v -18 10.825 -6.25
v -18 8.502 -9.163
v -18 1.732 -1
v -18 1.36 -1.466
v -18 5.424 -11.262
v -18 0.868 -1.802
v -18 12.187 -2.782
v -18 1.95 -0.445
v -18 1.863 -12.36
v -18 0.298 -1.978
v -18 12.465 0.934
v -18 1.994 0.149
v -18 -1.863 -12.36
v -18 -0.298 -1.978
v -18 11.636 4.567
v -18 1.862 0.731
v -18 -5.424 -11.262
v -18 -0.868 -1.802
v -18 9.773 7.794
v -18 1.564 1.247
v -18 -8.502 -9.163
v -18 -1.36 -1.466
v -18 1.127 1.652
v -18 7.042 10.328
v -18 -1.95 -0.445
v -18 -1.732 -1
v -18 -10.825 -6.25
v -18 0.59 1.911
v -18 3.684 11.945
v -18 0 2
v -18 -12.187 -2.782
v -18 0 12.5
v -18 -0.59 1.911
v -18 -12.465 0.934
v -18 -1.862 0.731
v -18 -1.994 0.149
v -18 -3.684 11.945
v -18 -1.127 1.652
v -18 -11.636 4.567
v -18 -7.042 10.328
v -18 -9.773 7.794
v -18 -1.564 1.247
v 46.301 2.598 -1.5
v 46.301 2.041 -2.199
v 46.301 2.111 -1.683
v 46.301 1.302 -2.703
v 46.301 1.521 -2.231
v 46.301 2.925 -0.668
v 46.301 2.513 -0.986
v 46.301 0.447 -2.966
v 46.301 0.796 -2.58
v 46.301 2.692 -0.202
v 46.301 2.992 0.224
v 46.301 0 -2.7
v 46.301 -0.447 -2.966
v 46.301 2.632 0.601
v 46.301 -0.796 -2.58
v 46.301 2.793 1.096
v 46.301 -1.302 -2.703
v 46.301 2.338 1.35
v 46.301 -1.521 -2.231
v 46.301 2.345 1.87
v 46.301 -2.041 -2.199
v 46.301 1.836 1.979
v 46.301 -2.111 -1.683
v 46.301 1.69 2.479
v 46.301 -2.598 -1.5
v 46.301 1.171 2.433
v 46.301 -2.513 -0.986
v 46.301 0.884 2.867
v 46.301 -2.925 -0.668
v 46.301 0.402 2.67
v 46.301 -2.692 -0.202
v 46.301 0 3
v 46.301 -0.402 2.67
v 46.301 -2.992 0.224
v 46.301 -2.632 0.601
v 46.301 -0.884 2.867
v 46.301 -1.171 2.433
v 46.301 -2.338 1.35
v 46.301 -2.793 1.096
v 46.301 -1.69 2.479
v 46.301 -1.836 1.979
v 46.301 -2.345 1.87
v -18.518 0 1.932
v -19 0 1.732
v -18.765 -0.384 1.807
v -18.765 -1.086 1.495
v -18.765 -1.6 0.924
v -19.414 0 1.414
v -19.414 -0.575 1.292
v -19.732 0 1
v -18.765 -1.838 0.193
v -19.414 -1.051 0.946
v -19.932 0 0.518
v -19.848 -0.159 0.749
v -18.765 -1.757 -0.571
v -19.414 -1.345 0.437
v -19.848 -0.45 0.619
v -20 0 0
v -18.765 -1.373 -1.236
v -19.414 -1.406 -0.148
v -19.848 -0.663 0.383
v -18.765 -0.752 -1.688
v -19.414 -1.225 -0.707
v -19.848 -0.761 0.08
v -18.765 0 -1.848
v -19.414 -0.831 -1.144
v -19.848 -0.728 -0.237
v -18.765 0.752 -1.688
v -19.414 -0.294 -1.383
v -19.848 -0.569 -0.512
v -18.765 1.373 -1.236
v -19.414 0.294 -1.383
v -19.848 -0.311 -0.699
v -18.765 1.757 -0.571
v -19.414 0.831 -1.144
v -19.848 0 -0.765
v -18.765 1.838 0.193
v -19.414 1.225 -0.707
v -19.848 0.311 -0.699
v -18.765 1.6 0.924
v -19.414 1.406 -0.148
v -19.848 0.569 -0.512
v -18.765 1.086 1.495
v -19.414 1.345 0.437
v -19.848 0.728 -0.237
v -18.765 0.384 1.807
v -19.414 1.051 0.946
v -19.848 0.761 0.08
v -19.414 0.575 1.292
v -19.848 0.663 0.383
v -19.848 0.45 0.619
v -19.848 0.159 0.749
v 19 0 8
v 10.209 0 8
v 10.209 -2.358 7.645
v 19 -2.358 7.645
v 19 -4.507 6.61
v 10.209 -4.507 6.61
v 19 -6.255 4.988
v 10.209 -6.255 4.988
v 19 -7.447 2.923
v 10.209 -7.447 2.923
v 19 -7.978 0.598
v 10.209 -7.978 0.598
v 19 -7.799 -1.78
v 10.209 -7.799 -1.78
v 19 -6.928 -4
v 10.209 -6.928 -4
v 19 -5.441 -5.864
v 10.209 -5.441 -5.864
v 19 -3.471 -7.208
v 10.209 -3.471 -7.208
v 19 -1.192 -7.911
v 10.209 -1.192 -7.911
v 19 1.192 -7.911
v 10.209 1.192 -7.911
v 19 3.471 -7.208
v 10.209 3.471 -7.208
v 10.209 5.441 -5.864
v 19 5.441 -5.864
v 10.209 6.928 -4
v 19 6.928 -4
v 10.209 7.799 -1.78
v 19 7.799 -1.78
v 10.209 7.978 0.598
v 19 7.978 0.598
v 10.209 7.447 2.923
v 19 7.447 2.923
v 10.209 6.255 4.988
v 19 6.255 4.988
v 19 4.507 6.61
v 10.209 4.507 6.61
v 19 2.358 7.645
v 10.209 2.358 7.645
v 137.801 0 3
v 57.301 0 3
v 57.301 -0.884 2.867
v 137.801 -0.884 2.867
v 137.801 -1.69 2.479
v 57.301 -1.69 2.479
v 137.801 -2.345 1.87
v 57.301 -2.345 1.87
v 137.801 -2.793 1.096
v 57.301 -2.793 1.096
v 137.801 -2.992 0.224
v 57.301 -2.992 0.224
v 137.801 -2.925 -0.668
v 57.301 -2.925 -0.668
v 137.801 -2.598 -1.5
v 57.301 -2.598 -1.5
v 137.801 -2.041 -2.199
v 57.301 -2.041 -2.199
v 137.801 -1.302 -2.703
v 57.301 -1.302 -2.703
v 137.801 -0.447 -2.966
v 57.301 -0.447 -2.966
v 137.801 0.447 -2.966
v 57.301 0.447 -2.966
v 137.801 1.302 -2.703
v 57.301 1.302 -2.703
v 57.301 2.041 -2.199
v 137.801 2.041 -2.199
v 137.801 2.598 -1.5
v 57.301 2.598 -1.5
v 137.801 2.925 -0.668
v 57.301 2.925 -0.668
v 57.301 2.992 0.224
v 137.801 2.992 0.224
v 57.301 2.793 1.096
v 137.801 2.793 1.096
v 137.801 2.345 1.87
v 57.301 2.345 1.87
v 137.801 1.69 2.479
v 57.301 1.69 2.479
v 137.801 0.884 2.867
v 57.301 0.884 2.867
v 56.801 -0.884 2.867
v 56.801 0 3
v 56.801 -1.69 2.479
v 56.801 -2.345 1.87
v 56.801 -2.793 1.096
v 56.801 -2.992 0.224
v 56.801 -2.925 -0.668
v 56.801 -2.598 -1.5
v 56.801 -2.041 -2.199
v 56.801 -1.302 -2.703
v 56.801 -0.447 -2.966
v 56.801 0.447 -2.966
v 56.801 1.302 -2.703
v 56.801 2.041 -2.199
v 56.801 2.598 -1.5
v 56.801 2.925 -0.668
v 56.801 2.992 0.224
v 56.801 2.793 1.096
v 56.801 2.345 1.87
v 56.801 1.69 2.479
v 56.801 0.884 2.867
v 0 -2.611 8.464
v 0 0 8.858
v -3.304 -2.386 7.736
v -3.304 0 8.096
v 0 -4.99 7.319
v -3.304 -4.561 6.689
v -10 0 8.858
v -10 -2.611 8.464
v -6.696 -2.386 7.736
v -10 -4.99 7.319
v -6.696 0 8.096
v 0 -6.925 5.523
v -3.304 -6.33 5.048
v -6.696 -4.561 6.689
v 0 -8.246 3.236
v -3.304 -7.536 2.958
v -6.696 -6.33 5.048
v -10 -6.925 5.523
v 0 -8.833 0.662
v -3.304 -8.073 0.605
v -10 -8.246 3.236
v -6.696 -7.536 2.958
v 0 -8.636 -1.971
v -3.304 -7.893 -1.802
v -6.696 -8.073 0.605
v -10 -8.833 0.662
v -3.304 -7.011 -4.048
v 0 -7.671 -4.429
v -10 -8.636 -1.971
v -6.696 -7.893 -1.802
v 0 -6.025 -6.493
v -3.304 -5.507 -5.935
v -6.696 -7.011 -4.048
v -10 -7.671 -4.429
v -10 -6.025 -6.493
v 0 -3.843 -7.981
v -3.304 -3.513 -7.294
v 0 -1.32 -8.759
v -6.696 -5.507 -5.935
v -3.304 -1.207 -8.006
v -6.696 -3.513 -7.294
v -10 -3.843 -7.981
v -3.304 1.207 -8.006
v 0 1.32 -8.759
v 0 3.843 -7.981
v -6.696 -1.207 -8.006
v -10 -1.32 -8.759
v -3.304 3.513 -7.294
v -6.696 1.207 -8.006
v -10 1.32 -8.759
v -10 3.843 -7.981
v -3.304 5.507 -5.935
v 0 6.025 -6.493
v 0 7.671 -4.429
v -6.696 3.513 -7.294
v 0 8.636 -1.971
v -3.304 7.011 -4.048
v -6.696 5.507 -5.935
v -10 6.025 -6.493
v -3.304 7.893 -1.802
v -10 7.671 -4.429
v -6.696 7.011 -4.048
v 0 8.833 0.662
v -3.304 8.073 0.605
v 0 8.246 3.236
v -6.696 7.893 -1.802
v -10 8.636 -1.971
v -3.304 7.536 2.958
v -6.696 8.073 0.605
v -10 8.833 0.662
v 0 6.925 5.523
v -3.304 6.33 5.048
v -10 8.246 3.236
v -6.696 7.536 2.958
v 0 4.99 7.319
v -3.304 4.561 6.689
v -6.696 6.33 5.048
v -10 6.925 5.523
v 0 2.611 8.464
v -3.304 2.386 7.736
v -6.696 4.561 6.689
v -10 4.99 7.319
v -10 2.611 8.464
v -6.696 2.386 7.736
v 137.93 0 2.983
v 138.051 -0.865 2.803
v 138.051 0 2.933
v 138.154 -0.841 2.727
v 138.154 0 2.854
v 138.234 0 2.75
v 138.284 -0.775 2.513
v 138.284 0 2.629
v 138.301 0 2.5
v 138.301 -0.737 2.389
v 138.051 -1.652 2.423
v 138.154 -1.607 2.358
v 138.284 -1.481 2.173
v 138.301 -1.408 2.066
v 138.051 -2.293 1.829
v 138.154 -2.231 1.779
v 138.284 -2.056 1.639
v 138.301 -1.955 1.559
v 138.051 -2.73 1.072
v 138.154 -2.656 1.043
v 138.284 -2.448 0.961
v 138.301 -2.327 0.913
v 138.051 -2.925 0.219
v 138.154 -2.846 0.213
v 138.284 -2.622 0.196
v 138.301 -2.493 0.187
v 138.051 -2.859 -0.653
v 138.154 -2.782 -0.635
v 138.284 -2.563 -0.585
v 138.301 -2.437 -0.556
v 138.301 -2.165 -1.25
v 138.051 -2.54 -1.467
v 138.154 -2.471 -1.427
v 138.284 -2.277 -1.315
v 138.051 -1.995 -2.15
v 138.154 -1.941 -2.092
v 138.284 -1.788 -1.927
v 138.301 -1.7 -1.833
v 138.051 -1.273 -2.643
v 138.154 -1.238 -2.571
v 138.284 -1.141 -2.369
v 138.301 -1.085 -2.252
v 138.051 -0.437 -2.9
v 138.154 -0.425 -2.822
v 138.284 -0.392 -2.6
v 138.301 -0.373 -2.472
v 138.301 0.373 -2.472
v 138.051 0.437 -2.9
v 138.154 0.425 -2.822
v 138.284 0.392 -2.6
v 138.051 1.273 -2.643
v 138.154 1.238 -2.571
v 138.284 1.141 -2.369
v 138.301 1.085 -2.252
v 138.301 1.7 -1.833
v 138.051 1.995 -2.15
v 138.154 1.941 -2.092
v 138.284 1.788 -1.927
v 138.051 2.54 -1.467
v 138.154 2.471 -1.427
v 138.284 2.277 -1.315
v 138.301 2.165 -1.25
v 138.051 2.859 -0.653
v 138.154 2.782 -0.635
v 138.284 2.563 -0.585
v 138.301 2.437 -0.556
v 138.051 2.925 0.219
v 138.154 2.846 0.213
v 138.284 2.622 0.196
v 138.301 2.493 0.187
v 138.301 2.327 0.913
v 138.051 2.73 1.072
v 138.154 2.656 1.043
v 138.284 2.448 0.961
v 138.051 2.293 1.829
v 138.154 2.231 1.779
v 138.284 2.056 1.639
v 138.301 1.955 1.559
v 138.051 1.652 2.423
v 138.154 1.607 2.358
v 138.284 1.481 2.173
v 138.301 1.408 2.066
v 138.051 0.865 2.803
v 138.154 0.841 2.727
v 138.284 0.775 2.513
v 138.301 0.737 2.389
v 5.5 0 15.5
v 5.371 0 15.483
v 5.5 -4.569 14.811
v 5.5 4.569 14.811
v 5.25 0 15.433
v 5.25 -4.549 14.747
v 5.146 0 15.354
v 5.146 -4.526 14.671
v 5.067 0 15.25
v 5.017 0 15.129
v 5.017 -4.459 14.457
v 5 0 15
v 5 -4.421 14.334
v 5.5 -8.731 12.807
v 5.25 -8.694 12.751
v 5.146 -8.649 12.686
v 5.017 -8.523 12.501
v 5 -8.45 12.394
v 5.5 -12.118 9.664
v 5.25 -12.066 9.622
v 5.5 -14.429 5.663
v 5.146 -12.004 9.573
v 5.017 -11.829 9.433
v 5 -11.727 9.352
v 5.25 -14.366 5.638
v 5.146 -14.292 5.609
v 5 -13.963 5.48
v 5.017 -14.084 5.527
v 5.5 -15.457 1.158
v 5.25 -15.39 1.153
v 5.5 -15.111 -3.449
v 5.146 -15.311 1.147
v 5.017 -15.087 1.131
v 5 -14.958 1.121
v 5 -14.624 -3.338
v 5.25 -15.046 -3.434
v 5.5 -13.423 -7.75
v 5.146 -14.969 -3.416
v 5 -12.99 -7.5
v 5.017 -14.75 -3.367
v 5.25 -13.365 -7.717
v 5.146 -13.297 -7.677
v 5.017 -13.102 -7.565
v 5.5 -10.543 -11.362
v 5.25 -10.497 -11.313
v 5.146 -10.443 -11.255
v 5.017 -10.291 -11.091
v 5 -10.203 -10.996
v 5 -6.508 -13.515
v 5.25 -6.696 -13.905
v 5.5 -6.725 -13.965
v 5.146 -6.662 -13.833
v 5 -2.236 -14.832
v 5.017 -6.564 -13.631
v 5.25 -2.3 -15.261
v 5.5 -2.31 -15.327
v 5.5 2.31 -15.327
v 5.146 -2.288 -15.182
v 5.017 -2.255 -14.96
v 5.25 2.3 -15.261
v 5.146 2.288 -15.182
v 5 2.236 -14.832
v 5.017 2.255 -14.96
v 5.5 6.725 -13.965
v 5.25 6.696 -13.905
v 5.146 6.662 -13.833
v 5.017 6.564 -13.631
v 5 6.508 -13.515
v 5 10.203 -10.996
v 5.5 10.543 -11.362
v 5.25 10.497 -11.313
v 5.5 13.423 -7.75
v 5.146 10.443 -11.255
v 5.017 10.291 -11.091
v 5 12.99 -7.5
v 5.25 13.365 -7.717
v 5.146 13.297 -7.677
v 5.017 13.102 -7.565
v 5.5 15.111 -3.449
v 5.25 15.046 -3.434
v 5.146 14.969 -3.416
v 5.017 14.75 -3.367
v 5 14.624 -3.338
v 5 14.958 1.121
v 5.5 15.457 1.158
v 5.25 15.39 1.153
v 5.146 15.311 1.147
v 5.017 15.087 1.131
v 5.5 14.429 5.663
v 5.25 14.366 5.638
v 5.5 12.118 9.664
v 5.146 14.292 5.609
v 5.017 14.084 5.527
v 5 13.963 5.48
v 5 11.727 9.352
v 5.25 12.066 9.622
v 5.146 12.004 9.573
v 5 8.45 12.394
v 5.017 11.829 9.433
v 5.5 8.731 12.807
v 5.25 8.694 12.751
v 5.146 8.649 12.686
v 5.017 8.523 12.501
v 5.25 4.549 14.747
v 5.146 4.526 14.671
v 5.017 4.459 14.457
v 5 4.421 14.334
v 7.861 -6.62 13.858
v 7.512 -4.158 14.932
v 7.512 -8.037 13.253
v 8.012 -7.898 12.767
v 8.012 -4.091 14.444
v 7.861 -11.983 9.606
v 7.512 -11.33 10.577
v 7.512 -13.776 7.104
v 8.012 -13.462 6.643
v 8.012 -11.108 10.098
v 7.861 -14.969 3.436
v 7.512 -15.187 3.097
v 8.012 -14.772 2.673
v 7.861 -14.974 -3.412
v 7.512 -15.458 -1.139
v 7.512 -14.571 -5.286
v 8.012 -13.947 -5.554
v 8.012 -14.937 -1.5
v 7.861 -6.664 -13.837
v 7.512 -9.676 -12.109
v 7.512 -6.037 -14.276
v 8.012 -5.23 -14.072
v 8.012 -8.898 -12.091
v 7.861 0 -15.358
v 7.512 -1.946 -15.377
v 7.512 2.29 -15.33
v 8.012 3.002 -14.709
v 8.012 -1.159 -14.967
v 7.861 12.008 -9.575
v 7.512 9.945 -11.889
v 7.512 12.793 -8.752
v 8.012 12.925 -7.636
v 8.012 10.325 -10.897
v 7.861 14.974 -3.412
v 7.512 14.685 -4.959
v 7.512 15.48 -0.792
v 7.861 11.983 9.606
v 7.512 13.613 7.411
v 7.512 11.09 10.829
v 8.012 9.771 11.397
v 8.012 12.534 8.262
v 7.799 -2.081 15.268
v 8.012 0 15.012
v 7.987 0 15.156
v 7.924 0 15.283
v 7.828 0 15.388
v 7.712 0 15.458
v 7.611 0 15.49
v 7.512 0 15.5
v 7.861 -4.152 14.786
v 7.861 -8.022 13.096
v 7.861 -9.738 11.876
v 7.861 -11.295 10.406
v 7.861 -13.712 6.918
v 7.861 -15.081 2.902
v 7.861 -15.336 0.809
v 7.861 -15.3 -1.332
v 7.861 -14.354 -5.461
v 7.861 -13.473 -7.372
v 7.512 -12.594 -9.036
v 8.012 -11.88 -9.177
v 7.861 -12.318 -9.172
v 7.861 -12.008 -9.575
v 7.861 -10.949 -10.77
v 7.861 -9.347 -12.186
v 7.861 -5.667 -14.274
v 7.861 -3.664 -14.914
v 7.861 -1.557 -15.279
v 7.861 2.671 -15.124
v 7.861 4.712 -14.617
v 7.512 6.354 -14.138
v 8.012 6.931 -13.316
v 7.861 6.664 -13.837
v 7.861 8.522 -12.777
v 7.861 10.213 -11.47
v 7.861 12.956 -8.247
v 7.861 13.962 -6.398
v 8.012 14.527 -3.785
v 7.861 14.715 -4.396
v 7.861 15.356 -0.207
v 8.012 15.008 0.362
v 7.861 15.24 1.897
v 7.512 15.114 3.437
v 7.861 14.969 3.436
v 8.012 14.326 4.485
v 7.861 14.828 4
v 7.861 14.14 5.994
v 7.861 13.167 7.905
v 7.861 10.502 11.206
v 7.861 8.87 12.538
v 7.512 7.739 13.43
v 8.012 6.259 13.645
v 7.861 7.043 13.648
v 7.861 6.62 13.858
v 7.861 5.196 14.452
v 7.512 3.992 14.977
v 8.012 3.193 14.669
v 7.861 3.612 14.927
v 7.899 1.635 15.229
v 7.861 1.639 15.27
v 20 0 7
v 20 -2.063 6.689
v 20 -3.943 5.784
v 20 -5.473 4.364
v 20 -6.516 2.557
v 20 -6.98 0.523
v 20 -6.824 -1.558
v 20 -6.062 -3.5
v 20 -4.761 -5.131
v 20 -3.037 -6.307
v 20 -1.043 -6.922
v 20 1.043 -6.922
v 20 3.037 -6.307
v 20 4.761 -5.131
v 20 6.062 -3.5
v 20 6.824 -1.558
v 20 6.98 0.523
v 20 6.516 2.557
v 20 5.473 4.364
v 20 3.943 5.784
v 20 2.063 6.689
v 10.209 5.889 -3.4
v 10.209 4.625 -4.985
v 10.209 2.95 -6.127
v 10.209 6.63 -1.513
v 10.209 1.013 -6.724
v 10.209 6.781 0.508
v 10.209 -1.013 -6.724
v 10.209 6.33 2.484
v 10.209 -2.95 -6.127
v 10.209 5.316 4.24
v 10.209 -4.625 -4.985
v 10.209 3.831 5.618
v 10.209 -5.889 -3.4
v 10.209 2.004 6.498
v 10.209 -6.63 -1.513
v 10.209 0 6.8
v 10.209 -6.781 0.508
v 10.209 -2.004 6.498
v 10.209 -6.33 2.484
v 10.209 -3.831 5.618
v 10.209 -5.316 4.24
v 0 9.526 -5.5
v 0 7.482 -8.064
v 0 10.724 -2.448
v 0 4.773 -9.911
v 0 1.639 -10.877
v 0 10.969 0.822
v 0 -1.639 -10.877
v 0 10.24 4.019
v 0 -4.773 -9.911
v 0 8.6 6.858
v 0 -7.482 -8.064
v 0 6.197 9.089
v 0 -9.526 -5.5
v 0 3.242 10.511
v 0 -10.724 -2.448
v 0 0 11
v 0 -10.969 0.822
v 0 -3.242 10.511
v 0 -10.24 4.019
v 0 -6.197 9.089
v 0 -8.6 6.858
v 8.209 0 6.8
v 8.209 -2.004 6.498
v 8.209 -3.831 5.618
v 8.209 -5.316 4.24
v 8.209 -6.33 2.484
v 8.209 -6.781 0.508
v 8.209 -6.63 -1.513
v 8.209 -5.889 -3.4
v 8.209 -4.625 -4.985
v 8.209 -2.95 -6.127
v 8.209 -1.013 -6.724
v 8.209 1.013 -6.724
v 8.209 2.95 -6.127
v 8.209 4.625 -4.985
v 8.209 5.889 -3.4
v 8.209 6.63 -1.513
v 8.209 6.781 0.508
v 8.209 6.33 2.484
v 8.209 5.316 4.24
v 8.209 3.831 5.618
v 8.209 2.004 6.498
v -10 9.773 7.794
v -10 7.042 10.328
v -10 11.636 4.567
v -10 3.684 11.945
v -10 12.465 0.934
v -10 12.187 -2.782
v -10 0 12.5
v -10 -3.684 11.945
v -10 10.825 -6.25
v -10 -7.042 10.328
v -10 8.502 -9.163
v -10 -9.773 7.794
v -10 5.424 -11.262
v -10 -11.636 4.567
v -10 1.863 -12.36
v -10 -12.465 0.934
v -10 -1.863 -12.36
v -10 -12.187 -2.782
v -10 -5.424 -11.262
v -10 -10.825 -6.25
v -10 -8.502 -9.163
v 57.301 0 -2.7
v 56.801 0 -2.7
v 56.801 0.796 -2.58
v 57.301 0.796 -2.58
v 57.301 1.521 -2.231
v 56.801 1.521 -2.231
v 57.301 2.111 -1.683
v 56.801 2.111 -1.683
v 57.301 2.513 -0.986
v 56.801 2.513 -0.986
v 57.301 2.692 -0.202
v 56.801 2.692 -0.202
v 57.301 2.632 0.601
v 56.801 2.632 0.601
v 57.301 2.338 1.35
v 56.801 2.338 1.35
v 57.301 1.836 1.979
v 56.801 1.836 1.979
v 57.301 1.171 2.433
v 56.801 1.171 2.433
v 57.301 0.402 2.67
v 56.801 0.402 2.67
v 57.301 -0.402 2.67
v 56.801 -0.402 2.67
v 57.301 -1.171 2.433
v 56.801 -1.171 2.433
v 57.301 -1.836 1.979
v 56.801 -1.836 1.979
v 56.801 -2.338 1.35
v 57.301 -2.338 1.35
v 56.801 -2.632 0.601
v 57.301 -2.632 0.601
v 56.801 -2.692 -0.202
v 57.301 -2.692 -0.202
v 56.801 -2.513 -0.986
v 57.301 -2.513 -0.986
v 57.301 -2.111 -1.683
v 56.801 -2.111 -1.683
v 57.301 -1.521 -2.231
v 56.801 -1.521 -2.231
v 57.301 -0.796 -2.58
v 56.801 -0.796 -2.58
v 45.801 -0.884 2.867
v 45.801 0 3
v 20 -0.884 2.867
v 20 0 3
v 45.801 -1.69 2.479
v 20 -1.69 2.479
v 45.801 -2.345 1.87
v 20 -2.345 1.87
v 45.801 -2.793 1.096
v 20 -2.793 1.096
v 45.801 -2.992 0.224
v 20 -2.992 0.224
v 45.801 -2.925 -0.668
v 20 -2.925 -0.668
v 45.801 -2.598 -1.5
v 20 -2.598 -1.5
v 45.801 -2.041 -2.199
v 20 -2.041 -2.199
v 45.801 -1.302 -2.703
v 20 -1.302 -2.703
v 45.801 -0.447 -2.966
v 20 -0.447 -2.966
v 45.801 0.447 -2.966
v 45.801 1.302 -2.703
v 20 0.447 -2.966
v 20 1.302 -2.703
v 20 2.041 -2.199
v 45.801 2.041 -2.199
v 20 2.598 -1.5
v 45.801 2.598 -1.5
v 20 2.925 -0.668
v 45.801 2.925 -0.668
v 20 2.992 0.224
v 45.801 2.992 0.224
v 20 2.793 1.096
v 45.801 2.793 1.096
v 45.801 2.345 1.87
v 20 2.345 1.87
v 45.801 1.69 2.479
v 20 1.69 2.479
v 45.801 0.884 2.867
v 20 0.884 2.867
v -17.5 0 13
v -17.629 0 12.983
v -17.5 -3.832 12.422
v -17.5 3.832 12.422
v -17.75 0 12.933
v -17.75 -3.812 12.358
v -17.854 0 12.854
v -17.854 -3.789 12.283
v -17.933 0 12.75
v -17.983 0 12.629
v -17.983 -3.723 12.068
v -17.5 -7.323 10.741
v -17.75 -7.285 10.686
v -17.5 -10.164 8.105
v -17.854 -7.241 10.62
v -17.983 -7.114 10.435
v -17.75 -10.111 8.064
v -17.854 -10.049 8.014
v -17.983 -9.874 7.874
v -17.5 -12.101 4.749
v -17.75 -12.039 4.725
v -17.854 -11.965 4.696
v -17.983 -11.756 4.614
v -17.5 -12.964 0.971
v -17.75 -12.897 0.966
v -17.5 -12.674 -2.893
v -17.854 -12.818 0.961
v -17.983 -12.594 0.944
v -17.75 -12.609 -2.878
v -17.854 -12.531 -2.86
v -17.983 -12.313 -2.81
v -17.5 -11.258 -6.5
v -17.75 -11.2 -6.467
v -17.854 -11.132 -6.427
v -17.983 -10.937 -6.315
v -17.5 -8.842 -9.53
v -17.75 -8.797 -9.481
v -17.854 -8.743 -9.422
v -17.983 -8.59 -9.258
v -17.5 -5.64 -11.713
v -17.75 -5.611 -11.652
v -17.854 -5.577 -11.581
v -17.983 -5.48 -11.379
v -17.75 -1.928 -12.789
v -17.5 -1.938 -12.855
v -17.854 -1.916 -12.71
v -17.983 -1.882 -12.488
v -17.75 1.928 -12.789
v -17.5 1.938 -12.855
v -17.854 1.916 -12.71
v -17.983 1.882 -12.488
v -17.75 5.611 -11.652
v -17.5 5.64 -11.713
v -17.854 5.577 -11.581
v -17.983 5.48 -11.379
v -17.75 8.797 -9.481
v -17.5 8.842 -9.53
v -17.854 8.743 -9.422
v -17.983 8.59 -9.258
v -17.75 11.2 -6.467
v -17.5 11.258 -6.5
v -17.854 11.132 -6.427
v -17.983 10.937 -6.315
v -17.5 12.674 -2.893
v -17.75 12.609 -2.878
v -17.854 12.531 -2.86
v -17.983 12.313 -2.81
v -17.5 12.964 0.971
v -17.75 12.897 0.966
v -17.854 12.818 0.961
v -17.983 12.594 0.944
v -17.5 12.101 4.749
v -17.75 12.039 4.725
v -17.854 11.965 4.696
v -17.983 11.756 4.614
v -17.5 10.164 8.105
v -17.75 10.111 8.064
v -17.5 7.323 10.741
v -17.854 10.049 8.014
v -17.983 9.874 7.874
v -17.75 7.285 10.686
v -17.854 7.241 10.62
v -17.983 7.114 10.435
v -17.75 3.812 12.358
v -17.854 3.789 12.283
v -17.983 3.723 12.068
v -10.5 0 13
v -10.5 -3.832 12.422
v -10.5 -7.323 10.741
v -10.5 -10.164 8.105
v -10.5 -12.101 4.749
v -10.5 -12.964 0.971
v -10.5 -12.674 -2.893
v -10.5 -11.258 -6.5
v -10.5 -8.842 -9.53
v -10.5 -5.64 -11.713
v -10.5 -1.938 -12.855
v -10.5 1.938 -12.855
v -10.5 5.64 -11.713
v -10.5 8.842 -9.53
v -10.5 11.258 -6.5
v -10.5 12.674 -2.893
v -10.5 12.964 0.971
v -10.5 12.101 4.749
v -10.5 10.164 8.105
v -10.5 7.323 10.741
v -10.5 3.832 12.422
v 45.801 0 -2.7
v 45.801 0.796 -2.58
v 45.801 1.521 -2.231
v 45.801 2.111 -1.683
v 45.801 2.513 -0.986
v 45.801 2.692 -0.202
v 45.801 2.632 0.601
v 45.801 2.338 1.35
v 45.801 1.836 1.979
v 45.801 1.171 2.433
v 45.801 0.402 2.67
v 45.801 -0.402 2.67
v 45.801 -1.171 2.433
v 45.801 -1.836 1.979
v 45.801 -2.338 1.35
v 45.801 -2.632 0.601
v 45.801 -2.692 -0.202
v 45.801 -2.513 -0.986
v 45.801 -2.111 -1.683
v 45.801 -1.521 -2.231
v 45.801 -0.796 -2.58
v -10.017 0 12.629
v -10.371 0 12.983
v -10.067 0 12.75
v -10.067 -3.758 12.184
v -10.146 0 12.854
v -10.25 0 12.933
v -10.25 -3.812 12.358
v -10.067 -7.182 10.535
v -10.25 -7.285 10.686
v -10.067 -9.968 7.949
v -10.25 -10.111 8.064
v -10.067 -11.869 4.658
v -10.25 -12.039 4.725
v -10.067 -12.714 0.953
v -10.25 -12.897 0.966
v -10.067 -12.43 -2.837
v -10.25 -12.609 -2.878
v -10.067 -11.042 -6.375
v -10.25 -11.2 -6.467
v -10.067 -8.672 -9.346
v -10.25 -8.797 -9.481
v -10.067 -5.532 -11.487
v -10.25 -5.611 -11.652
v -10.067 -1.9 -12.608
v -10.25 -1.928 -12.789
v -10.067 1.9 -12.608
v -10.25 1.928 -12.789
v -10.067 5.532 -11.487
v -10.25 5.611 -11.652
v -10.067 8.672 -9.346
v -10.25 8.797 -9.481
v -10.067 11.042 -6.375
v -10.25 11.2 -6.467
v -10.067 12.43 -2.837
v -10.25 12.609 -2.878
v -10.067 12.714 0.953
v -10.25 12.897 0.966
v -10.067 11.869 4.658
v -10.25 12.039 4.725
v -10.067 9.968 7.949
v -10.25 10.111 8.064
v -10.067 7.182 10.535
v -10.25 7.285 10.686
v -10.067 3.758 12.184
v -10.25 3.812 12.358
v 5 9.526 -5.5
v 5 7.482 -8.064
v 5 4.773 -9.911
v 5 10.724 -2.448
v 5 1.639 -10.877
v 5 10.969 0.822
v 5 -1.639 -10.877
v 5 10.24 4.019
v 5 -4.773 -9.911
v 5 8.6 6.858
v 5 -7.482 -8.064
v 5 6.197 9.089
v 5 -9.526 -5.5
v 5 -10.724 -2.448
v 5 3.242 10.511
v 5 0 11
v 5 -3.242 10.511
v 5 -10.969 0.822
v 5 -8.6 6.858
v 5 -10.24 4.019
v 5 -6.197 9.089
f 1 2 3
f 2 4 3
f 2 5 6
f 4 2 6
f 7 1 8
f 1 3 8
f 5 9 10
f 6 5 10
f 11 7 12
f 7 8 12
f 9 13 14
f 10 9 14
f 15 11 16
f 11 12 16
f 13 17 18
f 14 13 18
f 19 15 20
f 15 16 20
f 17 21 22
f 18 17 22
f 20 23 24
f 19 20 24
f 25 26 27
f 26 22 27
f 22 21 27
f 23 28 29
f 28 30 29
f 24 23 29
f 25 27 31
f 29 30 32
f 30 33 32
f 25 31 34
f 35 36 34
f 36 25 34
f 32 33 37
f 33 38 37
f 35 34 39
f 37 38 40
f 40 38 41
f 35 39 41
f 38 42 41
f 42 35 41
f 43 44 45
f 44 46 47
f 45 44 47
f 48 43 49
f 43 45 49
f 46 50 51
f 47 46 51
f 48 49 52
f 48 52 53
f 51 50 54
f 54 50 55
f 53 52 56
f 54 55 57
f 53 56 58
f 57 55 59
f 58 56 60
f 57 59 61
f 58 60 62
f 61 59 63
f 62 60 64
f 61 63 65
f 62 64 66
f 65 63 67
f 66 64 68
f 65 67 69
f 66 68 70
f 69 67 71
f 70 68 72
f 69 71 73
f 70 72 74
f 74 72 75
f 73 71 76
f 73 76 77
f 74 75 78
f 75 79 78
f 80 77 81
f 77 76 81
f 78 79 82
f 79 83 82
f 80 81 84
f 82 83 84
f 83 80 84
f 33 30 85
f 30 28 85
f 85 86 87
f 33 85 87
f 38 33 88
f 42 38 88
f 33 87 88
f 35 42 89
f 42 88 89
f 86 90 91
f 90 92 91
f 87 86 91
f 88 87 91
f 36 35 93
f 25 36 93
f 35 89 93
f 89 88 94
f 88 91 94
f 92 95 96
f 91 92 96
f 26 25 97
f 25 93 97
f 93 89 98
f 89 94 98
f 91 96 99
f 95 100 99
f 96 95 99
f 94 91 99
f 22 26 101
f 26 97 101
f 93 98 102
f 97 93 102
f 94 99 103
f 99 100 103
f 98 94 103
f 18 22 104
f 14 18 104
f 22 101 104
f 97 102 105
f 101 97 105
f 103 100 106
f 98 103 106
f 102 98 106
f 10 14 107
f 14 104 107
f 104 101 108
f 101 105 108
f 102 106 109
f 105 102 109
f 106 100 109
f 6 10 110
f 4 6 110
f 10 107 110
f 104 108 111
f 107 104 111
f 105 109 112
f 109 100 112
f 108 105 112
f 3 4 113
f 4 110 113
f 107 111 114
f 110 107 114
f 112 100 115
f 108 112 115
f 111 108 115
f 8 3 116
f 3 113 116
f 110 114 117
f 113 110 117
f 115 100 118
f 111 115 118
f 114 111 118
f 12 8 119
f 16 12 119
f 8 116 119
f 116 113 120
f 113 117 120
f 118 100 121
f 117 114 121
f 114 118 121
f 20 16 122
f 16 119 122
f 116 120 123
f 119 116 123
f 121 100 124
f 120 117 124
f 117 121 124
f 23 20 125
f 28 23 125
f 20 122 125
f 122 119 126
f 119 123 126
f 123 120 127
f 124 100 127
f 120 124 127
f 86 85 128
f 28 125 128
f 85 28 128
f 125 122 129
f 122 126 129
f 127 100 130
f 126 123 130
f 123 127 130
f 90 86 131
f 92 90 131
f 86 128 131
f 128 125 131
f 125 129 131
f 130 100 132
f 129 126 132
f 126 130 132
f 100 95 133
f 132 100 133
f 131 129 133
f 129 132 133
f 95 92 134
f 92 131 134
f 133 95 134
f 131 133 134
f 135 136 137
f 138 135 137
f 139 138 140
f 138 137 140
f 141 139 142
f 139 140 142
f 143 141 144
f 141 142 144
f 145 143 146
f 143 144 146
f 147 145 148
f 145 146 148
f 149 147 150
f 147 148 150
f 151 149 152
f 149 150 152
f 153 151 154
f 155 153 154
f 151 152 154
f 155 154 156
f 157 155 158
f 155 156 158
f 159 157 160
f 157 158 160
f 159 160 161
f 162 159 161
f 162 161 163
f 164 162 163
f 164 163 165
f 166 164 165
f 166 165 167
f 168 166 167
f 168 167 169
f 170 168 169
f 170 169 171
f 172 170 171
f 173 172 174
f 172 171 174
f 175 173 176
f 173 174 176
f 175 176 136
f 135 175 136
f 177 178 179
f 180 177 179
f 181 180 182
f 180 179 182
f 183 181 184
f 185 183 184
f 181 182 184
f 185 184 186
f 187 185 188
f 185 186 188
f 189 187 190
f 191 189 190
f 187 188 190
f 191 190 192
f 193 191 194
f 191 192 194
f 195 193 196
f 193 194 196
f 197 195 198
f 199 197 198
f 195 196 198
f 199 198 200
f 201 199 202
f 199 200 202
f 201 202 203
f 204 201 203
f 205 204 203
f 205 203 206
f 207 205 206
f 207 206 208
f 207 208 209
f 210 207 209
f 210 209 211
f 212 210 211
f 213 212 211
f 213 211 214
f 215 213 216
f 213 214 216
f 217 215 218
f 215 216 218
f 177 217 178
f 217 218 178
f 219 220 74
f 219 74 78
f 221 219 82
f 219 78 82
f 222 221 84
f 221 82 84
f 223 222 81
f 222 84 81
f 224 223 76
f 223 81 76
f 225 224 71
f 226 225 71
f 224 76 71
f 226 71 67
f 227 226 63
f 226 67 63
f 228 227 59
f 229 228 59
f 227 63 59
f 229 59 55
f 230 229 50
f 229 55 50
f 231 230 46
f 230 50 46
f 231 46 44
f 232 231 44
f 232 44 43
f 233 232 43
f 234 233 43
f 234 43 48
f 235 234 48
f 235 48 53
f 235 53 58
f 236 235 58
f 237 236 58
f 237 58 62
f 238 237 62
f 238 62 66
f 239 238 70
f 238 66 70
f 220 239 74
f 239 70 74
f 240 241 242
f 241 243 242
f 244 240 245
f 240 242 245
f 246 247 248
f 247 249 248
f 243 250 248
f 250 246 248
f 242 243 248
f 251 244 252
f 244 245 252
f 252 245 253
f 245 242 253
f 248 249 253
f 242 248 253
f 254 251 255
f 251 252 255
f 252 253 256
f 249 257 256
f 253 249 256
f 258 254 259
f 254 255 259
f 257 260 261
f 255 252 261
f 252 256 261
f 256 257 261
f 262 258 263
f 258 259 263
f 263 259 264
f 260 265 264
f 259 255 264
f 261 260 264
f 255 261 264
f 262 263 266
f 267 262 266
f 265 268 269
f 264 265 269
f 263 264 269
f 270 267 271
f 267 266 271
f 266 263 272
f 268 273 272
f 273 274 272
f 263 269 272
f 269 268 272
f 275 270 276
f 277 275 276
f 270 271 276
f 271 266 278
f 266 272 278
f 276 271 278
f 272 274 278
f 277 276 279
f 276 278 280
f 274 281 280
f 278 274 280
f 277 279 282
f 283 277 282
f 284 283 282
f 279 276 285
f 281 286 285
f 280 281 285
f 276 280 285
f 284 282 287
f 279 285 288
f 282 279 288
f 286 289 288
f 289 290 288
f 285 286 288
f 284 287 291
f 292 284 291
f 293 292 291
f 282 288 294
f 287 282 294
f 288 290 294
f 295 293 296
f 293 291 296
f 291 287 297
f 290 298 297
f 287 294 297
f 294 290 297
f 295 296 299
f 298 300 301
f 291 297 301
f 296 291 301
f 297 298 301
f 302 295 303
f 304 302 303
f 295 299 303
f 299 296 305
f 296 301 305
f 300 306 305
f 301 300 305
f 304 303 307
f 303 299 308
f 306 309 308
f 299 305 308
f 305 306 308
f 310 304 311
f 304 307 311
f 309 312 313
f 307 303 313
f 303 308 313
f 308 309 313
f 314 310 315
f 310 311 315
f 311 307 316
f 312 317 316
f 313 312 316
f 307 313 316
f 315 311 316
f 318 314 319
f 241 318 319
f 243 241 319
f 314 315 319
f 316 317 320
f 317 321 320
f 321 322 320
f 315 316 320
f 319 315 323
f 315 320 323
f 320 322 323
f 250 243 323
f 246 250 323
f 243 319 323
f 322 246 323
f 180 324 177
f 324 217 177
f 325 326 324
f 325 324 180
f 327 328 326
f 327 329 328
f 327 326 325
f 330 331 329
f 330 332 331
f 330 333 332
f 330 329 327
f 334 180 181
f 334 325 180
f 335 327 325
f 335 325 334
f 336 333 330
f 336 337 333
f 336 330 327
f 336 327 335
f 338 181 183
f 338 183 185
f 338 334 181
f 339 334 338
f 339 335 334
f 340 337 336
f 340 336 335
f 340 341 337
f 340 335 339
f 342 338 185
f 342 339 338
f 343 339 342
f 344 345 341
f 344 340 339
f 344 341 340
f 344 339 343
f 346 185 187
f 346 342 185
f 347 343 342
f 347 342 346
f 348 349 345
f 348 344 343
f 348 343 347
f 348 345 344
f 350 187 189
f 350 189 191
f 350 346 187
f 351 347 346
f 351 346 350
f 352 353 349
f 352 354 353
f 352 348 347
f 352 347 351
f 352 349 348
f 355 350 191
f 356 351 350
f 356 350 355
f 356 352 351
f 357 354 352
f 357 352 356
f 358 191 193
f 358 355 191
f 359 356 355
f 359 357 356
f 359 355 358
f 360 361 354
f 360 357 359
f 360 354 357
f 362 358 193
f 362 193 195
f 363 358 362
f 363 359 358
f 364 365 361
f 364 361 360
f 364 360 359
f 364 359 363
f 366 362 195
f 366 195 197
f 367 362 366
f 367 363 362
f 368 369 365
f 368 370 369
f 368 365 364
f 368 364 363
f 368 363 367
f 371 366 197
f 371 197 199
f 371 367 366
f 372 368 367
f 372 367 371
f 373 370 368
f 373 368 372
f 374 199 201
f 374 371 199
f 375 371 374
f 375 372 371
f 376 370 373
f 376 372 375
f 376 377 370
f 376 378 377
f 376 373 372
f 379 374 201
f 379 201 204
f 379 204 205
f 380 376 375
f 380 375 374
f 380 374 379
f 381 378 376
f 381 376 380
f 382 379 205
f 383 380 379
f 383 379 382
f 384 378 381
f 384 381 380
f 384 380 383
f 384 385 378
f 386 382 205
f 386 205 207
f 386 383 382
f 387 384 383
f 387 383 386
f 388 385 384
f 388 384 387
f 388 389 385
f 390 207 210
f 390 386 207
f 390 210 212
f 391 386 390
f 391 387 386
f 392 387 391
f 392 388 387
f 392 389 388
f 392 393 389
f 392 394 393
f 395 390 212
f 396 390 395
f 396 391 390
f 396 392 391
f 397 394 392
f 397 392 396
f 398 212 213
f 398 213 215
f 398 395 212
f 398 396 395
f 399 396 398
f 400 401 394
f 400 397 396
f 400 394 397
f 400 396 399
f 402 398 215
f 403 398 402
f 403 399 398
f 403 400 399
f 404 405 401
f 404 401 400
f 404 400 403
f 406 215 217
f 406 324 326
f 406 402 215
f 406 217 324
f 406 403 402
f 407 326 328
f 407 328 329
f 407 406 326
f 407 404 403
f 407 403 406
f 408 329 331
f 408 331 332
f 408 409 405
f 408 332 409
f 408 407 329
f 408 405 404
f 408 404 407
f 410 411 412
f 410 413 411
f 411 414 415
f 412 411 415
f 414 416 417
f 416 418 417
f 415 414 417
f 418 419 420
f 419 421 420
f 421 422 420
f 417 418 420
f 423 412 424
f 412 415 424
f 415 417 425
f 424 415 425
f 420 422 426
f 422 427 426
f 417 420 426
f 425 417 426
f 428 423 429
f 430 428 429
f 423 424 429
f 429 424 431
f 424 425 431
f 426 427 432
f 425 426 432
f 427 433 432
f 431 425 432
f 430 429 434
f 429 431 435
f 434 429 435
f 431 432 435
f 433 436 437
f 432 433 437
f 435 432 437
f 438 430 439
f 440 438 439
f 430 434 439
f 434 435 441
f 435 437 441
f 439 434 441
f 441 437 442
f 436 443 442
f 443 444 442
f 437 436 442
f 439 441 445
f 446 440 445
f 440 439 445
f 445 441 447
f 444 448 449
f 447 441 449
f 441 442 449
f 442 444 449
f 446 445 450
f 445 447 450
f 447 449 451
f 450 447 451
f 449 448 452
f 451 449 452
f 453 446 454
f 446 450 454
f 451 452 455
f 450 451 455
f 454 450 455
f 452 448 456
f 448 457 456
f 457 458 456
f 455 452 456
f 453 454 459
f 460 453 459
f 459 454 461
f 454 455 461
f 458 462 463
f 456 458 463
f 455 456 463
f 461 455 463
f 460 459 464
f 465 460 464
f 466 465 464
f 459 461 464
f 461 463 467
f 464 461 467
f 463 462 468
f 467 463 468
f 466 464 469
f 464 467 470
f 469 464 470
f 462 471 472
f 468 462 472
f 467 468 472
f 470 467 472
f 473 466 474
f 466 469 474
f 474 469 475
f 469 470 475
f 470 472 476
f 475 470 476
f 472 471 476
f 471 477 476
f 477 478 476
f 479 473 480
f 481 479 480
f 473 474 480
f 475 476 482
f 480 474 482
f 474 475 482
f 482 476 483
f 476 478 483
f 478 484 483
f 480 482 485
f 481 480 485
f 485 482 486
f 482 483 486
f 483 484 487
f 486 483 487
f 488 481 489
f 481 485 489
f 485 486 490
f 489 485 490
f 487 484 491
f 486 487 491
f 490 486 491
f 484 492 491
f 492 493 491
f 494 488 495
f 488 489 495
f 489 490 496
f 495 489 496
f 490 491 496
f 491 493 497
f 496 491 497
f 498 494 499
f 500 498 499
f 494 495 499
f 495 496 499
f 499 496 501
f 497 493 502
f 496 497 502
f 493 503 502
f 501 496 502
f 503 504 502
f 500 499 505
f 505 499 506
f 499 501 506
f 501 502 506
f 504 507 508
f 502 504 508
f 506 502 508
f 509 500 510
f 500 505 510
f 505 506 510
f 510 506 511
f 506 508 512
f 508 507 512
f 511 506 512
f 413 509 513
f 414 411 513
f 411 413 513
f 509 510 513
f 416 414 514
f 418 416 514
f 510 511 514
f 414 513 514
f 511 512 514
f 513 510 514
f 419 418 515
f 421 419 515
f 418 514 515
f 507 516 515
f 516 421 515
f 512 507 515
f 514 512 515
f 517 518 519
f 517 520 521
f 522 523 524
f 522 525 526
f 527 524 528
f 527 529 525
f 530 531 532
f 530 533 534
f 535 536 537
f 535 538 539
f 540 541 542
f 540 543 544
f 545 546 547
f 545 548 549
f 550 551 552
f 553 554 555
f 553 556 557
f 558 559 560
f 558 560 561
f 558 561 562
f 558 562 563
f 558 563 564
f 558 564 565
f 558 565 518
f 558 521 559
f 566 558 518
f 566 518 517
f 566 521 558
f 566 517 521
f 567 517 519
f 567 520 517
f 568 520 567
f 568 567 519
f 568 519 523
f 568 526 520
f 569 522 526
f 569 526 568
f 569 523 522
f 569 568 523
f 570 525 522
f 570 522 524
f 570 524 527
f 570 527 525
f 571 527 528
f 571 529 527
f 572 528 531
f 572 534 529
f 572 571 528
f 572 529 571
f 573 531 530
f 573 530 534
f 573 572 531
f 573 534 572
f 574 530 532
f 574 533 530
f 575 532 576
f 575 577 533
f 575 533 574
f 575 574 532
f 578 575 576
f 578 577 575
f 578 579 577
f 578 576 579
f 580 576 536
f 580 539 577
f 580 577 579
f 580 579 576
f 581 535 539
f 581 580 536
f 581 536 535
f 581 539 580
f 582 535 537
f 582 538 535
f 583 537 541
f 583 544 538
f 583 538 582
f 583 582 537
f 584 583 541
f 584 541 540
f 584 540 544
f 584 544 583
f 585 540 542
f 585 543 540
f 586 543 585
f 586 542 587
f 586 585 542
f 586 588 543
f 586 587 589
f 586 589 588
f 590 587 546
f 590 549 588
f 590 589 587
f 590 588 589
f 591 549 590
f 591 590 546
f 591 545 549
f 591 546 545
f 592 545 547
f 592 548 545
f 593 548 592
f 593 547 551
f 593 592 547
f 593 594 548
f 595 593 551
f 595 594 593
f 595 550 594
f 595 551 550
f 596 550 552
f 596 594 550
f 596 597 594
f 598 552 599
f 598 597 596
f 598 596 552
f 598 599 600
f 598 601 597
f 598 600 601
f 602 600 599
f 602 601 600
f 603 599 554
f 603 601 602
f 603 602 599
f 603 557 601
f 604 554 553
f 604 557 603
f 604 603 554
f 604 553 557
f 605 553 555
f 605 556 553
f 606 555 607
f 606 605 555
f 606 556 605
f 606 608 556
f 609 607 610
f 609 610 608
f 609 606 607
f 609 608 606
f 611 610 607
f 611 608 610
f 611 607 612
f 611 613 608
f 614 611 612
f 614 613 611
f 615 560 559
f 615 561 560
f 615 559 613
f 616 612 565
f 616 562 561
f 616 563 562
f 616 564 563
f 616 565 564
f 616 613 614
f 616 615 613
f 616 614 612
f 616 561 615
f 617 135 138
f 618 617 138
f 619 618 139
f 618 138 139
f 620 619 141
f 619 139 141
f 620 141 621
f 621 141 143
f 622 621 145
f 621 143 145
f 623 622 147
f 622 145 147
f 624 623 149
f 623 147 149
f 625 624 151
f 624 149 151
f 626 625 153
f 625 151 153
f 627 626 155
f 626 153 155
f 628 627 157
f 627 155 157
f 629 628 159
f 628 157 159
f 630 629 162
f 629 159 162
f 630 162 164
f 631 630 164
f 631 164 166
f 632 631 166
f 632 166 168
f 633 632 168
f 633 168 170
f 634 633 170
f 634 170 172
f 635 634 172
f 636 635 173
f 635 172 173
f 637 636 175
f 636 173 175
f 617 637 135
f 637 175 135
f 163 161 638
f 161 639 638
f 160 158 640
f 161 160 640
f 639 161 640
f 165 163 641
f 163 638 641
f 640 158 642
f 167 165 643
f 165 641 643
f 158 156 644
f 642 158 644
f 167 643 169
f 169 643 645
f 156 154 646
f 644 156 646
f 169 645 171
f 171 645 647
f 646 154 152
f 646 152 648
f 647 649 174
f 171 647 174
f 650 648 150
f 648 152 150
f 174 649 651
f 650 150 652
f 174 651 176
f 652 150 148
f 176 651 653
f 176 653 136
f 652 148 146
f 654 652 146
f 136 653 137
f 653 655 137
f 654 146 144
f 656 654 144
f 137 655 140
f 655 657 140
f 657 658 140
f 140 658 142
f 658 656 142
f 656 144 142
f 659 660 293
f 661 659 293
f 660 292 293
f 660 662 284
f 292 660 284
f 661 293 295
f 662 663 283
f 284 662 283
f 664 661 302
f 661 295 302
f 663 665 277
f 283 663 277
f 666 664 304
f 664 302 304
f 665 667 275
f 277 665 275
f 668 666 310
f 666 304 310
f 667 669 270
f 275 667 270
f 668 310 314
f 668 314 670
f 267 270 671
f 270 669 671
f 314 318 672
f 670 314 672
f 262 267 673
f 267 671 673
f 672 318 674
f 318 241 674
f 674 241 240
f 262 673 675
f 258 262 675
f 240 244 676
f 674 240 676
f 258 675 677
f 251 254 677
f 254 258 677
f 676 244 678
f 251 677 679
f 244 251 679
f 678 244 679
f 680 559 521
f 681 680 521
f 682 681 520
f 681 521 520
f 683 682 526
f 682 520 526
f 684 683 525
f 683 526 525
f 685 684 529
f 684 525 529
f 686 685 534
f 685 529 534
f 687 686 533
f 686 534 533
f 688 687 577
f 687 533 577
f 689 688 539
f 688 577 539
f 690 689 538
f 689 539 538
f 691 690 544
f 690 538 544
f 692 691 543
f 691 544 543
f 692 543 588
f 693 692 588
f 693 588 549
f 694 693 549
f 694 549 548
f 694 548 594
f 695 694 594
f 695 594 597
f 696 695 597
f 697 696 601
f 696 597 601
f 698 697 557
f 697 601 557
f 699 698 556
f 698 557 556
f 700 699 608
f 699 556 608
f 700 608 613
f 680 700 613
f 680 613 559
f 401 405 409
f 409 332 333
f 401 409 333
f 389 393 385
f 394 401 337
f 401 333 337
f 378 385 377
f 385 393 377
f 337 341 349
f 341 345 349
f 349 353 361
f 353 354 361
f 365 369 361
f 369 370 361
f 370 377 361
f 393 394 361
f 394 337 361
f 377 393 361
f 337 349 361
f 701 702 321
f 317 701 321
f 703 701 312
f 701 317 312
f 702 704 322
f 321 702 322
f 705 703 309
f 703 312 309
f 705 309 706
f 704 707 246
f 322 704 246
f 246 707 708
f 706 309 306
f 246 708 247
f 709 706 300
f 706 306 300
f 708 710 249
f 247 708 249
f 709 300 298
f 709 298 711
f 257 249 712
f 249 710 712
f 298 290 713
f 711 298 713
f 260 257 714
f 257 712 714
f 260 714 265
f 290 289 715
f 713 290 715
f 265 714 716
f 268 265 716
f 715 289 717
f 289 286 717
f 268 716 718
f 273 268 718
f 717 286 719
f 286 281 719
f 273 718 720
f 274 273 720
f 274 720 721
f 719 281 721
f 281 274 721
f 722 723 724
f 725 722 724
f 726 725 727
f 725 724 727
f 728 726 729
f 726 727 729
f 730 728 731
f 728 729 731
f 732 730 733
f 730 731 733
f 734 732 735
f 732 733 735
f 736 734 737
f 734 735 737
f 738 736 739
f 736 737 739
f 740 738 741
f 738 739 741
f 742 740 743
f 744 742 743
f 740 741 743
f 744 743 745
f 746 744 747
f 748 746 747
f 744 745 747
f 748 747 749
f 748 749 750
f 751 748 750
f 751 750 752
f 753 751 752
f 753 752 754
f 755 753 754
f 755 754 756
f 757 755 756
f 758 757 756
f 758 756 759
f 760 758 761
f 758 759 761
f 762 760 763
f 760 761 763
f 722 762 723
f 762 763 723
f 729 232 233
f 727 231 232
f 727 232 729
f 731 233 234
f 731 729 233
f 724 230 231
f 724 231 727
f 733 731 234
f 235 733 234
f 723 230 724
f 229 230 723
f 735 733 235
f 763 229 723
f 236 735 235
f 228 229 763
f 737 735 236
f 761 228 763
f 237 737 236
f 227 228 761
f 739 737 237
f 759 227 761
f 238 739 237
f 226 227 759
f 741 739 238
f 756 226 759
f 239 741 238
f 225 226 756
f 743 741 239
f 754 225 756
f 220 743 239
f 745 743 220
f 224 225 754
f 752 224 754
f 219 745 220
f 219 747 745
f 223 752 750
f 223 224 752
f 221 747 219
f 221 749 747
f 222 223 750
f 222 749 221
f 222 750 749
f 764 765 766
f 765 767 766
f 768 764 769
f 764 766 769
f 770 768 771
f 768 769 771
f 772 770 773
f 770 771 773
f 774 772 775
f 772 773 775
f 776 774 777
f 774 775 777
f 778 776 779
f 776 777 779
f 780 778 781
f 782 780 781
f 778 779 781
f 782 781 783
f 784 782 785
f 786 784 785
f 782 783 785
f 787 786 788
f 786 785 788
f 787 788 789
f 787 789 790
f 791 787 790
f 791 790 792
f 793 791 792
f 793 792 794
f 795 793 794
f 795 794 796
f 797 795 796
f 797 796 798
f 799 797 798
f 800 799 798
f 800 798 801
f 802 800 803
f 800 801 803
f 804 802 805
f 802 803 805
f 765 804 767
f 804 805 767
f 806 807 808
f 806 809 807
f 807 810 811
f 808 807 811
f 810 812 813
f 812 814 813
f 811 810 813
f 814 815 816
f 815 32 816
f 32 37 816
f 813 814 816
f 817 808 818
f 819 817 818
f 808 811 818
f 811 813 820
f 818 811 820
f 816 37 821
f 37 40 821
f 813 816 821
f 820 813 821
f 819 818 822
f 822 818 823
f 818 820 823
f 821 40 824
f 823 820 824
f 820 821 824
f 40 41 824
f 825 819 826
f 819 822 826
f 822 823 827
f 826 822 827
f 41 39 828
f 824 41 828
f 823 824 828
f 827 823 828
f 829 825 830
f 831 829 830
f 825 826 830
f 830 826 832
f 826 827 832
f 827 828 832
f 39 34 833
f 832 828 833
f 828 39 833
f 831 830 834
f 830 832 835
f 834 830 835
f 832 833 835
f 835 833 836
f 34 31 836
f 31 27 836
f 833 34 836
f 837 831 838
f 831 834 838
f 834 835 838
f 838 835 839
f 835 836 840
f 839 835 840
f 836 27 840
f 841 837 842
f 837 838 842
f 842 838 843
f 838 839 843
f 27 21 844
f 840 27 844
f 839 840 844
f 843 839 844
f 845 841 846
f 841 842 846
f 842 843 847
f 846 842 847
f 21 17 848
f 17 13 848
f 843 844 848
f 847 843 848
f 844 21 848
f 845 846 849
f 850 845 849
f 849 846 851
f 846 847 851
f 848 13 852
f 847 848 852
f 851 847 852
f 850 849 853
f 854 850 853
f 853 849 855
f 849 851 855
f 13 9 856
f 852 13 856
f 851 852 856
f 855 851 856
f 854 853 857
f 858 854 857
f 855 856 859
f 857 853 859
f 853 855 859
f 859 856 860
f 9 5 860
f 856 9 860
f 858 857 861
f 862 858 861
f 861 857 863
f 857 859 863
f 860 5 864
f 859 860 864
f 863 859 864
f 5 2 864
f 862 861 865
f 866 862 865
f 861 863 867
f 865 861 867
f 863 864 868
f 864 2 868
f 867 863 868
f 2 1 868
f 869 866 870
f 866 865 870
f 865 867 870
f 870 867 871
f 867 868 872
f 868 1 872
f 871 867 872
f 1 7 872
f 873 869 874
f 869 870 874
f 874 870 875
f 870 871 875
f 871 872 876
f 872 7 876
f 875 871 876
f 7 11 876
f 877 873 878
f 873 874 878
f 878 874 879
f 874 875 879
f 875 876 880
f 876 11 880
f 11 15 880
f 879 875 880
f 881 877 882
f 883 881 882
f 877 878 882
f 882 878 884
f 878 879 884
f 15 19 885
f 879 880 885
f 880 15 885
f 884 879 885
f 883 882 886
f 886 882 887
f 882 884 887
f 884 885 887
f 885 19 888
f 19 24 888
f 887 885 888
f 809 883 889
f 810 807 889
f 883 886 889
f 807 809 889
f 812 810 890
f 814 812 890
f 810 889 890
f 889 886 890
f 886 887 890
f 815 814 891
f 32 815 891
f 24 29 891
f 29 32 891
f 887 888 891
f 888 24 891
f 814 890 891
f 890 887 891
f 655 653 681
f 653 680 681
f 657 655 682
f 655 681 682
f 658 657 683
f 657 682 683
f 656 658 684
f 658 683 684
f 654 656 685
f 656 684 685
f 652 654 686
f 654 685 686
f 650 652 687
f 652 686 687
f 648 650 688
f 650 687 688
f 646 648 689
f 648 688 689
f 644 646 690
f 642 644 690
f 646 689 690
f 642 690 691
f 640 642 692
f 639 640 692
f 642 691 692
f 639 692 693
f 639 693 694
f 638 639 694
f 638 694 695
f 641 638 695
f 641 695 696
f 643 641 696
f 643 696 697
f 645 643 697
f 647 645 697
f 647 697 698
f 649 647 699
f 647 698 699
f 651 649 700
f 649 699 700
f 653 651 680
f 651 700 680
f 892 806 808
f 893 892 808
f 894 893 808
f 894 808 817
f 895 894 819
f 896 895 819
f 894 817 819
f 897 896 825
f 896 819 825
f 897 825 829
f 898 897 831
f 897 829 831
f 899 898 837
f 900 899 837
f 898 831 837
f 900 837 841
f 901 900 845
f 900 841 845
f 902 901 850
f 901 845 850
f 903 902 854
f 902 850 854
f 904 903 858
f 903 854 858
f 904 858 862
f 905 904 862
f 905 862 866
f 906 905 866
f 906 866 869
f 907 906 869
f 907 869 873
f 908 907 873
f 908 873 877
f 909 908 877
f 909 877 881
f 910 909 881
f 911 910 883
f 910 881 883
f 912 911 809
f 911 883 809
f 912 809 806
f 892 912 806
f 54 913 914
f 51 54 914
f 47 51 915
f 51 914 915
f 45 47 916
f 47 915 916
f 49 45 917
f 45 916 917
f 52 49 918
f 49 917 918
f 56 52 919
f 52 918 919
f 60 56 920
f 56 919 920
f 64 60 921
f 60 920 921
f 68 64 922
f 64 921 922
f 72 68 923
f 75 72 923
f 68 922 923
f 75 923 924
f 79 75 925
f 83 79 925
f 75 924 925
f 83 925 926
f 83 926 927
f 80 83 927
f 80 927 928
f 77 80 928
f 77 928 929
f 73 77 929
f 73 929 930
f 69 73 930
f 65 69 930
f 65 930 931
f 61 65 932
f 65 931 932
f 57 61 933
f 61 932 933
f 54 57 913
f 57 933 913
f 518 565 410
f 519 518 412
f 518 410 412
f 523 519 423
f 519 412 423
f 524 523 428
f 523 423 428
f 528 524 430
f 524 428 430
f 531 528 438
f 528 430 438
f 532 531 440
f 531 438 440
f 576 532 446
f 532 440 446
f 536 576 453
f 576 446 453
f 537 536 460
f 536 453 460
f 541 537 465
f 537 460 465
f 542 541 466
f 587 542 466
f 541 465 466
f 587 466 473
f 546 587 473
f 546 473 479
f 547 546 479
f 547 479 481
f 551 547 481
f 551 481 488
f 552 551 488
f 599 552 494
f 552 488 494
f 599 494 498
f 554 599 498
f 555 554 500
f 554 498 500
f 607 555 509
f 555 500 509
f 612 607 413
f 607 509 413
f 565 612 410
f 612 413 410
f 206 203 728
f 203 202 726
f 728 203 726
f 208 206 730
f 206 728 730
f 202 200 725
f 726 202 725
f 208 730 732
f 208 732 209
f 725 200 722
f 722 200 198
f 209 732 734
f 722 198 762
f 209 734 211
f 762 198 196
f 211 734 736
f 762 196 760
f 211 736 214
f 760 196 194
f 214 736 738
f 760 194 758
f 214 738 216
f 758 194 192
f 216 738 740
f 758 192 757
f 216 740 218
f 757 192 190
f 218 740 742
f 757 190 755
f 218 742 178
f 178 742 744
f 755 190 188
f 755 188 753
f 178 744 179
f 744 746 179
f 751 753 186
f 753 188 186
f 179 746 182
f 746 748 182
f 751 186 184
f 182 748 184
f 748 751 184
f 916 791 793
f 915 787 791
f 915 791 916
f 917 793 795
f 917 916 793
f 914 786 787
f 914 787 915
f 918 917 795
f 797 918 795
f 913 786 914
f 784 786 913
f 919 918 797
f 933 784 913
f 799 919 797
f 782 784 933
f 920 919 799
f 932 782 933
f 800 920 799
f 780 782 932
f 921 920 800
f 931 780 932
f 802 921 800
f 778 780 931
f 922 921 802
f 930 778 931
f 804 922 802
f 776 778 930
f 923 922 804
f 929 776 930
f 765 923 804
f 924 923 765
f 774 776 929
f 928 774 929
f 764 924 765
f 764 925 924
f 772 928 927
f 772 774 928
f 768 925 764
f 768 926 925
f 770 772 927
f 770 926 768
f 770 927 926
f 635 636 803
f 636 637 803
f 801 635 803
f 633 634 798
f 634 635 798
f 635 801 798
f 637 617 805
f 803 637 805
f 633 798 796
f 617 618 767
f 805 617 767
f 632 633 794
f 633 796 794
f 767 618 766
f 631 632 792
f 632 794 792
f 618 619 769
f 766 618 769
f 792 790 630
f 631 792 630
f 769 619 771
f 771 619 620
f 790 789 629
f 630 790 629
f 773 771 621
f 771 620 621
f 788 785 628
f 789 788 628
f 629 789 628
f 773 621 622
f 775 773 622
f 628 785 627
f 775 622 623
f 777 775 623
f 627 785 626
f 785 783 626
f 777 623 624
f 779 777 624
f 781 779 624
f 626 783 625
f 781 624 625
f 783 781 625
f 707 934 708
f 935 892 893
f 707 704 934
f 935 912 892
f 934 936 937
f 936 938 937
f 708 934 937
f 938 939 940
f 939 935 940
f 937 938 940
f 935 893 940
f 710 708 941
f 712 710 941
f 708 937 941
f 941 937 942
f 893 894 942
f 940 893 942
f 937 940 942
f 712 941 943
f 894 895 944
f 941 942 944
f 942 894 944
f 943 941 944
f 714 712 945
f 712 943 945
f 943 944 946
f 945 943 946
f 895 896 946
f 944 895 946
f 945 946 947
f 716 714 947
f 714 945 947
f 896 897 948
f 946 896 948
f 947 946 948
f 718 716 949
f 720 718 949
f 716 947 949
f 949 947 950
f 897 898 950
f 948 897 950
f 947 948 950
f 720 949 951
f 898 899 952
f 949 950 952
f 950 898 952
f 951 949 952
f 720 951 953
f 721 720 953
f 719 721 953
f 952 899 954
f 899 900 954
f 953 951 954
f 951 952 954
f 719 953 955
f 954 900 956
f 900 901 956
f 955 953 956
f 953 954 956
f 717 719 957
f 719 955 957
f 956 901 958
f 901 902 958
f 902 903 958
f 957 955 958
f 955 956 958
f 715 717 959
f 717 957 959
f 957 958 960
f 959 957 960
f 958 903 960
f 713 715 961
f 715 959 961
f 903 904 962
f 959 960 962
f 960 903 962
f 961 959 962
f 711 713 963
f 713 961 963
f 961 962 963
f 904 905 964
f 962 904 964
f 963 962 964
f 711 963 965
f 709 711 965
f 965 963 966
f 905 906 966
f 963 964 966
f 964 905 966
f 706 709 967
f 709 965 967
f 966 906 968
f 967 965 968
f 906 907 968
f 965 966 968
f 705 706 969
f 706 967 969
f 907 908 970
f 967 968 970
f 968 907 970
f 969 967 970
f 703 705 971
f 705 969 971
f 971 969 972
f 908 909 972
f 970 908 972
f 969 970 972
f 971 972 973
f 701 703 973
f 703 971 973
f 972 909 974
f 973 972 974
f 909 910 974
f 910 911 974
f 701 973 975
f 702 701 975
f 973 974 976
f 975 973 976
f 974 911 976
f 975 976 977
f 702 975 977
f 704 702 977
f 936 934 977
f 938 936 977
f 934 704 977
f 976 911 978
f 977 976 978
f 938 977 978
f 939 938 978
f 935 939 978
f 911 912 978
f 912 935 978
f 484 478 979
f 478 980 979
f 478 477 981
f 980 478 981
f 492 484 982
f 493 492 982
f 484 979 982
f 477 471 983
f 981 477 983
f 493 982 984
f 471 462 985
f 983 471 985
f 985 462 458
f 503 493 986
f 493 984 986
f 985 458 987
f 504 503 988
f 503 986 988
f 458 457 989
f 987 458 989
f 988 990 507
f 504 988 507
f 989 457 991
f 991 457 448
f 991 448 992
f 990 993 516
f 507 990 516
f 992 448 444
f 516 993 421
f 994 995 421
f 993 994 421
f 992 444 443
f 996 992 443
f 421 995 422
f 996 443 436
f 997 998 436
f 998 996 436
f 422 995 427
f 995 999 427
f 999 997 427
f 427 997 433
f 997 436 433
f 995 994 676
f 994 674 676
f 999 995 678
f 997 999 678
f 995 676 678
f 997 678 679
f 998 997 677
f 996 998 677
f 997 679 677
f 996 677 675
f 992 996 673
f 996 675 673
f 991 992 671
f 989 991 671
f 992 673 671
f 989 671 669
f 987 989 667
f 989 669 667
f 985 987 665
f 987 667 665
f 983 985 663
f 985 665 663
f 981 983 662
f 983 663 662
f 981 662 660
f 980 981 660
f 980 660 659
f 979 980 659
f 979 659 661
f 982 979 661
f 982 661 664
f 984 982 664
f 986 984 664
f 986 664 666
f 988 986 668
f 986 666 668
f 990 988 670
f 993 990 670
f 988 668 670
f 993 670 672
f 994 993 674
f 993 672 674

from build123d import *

# Parameters (mm, degrees)
CHAMFER_1_SIZE      = 1
CUT_EXTRUDE_START   = -0.5
SKETCH_2_R          = 3
SKETCH_2_R_2        = 2.7
CUT_EXTRUDE_1_DEPTH = 0.5
SKETCH_3_R          = 3
SKETCH_3_R_2        = 2.7
CUT_EXTRUDE_2_DEPTH = 0.5
FILLET_1_R          = 0.5


with BuildPart() as part:
    # Sketch 1 → 旋转1 (revolve)
    with BuildSketch(Plane.XY, mode=Mode.PRIVATE) as revolve_1_sk:
        with BuildLine():
            Line((0, 11), (0, 8.857864376))
            ThreePointArc((0, 8.857864376), (-5, 8), (-10, 8.857864376))
            Line((-10, 8.857864376), (-10, 13))
            Line((-10, 13), (-18, 13))
            Line((-18, 13), (-18, 2))
            ThreePointArc((-18, 2), (-19.414213562, 1.414213562), (-20, 0))
            Line((-20, 0), (-18, 0))
            Line((-18, 0), (-10, 0))
            Line((-10, 0), (0, 0))
            Line((0, 0), (20, 0))
            Line((20, 0), (138.300668613, 0))
            Line((138.300668613, 0), (138.300668613, 3))
            Line((138.300668613, 3), (20, 3))
            Line((20, 3), (20, 8))
            Line((20, 8), (10.209265355, 8))
            Line((10.209265355, 8), (10.209265355, 6.8))
            Line((10.209265355, 6.8), (8.209265355, 6.8))
            Line((8.209265355, 6.8), (8, 15.5))
            Line((8, 15.5), (5, 15.5))
            Line((5, 15.5), (5, 11))
            Line((5, 11), (0, 11))
        make_face()
    revolve(revolve_1_sk.sketch.rotate(Axis((0, 0, 0), (1, 0, 0)), 90), axis=Axis((0, 0, 0), (1, 0, 0)))

    # 倒角1
    chamfer_1_edges = [part.edges().sort_by_distance(p)[0] for p in [
        (20, 0, -8),
    ]]
    chamfer(chamfer_1_edges, length=CHAMFER_1_SIZE)

    # Sketch 2 → 切除-拉伸1 (cut)
    with BuildSketch(Plane(origin=(57.300668613, 0, 0), x_dir=(0, 0, -1), z_dir=(1, 0, 0)).offset(CUT_EXTRUDE_START)):
        with Locations(Location((0, 0, 0), (0, 0, 180))):
            Circle(SKETCH_2_R)
        Circle(SKETCH_2_R_2, mode=Mode.SUBTRACT)
    extrude(amount=CUT_EXTRUDE_1_DEPTH, mode=Mode.SUBTRACT)

    # 草图3 → 切除-拉伸2 (cut)
    with BuildSketch(Plane(origin=(46.300668613, 0, 0), x_dir=(0, 0, -1), z_dir=(1, 0, 0)).offset(CUT_EXTRUDE_START)):
        with Locations(Location((0, 0, 0), (0, 0, 180))):
            Circle(SKETCH_3_R)
        Circle(SKETCH_3_R_2, mode=Mode.SUBTRACT)
    extrude(amount=CUT_EXTRUDE_2_DEPTH, mode=Mode.SUBTRACT)

    # 圆角1
    fillet_1_edges = [part.edges().sort_by_distance(p)[0] for p in [
        (138.300668613, 0, -3),
        (-18, 0, -13),
        (-10, 0, -13),
        (5, 0, -15.5),
        (8, 0, -15.5),
    ]]
    fillet(fillet_1_edges, radius=FILLET_1_R)


solid = part.part
